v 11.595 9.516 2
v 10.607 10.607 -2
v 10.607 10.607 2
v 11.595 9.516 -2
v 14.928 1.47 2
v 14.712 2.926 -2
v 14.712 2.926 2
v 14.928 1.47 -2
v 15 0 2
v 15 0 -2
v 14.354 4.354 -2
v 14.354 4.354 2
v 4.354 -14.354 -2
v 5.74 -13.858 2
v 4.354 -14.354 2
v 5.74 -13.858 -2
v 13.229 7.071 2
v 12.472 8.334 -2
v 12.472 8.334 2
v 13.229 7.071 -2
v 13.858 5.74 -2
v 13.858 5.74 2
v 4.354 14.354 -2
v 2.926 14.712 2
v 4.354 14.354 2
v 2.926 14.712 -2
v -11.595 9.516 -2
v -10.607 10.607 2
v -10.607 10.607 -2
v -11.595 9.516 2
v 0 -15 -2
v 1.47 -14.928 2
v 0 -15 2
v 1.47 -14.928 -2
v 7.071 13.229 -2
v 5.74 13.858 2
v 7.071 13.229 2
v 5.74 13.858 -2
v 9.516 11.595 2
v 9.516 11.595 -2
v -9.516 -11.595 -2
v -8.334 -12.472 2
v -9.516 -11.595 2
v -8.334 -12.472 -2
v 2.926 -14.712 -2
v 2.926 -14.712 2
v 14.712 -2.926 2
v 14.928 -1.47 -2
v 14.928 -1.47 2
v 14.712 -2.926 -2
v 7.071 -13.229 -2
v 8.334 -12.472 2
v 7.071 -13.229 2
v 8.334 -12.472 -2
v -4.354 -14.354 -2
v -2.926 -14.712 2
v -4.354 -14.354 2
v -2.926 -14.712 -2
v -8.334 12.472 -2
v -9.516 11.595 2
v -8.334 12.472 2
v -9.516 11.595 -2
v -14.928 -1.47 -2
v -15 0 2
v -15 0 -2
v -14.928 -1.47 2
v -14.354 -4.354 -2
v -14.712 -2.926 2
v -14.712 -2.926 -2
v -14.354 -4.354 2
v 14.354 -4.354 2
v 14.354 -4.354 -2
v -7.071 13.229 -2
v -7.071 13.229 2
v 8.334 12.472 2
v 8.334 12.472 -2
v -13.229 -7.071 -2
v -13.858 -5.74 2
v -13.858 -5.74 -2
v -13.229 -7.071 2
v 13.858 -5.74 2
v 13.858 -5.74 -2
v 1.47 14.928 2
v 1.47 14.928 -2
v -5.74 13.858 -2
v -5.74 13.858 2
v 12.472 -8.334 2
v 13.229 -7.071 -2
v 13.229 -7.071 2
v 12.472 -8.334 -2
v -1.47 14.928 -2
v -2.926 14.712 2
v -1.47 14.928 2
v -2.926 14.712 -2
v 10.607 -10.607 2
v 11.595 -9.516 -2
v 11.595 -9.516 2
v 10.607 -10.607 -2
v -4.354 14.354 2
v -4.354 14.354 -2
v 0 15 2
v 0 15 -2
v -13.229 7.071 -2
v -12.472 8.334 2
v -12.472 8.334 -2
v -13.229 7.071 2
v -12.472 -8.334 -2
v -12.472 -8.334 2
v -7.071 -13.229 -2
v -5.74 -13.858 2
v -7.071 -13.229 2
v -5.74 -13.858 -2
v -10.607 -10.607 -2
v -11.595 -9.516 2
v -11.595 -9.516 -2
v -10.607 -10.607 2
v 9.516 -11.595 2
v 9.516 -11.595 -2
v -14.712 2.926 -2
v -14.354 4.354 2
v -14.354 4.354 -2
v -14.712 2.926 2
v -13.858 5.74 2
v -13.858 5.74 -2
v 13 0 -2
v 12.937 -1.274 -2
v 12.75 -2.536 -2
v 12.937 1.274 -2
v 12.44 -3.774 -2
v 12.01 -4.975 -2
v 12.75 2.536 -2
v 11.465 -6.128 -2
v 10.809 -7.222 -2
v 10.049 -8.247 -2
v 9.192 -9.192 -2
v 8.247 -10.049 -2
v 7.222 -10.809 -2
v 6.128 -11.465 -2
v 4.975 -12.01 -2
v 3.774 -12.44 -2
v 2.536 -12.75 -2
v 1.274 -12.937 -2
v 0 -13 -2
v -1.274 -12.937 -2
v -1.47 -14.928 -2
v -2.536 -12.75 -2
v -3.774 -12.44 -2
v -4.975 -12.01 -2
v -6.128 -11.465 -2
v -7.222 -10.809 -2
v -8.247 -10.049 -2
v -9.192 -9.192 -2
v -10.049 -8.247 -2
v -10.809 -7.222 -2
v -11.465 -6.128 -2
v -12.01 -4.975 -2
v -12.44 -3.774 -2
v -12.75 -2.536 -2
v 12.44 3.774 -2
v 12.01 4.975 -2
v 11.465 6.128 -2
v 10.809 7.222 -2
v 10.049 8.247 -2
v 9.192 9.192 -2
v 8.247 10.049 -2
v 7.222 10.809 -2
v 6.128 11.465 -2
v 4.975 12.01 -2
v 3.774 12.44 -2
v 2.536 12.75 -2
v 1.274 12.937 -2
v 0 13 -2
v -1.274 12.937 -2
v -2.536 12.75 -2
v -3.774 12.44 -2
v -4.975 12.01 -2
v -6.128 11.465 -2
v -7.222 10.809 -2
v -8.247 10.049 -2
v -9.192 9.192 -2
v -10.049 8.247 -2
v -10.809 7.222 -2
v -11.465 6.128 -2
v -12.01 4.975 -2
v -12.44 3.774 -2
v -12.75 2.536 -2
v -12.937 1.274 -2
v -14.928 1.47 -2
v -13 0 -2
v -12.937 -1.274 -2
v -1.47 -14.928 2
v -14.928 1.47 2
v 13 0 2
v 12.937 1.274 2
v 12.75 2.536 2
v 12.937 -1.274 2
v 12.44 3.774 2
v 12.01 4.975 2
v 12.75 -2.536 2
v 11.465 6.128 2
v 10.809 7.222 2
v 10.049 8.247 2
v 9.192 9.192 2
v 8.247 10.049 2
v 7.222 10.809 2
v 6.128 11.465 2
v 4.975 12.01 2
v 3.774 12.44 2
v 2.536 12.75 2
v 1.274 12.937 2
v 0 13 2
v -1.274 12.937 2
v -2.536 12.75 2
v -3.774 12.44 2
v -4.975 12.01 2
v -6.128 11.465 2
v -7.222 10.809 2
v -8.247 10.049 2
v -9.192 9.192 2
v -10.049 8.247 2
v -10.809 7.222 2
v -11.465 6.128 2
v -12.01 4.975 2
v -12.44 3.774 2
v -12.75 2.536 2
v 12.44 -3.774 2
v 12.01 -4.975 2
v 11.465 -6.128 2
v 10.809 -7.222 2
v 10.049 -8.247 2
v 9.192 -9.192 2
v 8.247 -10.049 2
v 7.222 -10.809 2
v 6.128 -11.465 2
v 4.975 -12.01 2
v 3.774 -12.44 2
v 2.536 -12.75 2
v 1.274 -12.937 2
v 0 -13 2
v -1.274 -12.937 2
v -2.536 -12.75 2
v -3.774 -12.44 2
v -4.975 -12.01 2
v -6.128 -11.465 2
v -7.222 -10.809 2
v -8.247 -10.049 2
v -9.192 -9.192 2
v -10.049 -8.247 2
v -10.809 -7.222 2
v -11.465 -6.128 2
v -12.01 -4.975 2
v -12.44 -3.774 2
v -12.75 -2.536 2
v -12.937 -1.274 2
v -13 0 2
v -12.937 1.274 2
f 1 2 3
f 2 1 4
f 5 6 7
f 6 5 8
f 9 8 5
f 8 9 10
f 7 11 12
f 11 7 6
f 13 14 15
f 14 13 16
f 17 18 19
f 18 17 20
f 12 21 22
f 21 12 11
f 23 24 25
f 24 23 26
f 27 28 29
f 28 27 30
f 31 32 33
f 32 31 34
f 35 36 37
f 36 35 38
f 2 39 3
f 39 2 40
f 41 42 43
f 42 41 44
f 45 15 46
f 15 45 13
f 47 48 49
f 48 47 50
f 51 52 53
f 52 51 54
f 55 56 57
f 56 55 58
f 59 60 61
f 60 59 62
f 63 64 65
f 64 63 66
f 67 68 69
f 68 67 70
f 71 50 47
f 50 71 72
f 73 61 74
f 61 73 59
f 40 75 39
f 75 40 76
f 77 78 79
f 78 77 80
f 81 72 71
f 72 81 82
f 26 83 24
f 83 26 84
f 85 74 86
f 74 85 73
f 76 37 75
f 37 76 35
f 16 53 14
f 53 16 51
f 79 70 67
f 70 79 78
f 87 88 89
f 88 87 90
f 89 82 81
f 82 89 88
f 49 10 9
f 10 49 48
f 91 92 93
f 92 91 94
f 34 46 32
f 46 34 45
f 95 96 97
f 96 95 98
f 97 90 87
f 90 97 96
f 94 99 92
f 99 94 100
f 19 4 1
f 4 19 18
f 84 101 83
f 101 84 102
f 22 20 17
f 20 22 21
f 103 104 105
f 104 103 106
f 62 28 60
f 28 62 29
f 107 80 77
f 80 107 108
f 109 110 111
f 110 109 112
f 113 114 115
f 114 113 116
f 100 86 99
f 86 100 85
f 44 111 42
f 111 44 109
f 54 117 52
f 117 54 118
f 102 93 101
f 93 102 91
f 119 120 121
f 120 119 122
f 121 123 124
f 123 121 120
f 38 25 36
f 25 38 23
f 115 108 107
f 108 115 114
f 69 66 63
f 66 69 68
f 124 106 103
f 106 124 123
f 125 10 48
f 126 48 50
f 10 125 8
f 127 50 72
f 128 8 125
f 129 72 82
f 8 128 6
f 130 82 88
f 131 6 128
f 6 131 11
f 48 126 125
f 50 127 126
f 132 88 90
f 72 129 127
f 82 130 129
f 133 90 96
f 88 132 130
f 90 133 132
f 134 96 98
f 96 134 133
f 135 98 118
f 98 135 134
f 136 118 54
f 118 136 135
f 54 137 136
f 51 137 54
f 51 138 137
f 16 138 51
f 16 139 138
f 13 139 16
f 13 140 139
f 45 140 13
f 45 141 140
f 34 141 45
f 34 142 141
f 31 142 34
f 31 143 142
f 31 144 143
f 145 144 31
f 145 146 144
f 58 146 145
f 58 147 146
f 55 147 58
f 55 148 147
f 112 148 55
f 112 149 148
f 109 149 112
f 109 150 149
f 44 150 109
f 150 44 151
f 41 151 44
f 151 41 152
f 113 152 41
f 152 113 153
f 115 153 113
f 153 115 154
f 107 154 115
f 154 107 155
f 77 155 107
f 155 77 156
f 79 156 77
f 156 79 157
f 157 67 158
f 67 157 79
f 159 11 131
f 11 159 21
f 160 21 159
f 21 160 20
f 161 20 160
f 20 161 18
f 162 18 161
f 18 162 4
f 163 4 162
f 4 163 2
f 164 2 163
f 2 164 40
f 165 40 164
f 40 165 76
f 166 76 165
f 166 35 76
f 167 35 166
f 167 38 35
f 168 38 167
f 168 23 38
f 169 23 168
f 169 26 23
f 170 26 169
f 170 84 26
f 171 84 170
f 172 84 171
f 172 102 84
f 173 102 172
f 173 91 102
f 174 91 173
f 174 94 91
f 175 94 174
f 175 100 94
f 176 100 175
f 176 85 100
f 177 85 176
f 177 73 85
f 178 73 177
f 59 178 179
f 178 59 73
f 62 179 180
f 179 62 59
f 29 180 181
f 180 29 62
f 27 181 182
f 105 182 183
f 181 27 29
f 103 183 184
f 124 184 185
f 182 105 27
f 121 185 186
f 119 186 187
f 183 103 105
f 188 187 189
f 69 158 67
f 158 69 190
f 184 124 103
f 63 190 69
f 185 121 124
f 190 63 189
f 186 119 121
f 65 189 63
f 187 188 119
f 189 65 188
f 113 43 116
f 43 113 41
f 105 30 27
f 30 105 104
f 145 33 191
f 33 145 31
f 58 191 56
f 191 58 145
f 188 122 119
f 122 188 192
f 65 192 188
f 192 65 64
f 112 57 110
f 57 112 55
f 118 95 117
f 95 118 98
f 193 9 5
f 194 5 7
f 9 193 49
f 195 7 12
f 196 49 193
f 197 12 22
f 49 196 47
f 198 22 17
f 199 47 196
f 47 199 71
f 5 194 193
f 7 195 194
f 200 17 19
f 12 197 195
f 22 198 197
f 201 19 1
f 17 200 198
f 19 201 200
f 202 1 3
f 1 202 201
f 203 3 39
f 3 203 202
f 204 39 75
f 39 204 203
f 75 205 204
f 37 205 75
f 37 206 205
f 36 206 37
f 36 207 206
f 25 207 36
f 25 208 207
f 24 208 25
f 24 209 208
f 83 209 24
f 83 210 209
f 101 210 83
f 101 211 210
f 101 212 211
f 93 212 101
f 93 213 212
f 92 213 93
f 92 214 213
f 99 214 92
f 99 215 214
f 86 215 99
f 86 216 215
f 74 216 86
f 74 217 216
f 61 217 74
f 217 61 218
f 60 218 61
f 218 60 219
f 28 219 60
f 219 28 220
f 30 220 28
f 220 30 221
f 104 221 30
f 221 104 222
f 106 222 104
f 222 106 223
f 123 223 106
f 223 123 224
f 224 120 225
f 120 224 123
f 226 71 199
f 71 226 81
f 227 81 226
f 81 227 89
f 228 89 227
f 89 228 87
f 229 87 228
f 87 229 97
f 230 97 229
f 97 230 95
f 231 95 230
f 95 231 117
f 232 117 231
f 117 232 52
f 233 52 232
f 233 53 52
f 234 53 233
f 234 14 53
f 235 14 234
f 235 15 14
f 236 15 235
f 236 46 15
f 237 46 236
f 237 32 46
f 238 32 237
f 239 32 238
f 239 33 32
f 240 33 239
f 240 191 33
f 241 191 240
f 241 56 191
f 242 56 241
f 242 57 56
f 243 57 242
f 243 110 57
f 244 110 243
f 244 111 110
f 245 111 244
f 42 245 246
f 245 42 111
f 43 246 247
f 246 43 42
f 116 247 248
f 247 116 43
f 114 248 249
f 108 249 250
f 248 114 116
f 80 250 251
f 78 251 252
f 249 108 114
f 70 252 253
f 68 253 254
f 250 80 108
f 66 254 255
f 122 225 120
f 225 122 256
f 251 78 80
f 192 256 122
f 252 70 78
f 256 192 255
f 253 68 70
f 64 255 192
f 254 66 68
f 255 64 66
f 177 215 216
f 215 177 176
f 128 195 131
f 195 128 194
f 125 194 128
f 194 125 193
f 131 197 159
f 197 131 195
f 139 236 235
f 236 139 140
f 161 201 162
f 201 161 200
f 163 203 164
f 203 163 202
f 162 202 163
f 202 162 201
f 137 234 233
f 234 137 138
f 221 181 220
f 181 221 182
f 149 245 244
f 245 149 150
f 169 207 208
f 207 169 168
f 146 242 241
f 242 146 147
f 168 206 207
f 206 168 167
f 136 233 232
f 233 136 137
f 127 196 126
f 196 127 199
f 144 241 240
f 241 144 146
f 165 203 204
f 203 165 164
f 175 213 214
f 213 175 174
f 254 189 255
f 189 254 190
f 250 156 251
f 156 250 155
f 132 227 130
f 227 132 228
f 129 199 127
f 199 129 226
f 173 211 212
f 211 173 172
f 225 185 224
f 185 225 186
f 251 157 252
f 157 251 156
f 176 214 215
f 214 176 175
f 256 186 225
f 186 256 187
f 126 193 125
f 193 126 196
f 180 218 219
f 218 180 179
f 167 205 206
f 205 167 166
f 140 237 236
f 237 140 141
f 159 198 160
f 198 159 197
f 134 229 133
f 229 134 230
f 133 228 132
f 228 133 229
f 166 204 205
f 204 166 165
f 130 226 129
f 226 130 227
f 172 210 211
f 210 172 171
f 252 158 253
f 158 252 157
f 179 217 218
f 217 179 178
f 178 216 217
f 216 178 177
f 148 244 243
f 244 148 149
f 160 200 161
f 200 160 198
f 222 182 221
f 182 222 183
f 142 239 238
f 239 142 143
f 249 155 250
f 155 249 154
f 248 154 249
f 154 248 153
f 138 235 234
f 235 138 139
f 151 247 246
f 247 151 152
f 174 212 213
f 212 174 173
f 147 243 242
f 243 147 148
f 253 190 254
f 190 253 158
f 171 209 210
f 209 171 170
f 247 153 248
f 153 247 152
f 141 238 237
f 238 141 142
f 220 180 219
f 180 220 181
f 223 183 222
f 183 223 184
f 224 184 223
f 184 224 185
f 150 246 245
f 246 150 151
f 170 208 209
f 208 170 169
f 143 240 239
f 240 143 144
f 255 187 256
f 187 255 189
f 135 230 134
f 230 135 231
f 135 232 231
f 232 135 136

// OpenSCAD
module Ring(hole_diameter, thickness, height) {
  $fn=64;
  difference() {
    cylinder(h=height, d=hole_diameter+thickness, center=true);
    cylinder(h=height+1, d=hole_diameter, center=true);
  }
}

Ring(26, 4, 4);
